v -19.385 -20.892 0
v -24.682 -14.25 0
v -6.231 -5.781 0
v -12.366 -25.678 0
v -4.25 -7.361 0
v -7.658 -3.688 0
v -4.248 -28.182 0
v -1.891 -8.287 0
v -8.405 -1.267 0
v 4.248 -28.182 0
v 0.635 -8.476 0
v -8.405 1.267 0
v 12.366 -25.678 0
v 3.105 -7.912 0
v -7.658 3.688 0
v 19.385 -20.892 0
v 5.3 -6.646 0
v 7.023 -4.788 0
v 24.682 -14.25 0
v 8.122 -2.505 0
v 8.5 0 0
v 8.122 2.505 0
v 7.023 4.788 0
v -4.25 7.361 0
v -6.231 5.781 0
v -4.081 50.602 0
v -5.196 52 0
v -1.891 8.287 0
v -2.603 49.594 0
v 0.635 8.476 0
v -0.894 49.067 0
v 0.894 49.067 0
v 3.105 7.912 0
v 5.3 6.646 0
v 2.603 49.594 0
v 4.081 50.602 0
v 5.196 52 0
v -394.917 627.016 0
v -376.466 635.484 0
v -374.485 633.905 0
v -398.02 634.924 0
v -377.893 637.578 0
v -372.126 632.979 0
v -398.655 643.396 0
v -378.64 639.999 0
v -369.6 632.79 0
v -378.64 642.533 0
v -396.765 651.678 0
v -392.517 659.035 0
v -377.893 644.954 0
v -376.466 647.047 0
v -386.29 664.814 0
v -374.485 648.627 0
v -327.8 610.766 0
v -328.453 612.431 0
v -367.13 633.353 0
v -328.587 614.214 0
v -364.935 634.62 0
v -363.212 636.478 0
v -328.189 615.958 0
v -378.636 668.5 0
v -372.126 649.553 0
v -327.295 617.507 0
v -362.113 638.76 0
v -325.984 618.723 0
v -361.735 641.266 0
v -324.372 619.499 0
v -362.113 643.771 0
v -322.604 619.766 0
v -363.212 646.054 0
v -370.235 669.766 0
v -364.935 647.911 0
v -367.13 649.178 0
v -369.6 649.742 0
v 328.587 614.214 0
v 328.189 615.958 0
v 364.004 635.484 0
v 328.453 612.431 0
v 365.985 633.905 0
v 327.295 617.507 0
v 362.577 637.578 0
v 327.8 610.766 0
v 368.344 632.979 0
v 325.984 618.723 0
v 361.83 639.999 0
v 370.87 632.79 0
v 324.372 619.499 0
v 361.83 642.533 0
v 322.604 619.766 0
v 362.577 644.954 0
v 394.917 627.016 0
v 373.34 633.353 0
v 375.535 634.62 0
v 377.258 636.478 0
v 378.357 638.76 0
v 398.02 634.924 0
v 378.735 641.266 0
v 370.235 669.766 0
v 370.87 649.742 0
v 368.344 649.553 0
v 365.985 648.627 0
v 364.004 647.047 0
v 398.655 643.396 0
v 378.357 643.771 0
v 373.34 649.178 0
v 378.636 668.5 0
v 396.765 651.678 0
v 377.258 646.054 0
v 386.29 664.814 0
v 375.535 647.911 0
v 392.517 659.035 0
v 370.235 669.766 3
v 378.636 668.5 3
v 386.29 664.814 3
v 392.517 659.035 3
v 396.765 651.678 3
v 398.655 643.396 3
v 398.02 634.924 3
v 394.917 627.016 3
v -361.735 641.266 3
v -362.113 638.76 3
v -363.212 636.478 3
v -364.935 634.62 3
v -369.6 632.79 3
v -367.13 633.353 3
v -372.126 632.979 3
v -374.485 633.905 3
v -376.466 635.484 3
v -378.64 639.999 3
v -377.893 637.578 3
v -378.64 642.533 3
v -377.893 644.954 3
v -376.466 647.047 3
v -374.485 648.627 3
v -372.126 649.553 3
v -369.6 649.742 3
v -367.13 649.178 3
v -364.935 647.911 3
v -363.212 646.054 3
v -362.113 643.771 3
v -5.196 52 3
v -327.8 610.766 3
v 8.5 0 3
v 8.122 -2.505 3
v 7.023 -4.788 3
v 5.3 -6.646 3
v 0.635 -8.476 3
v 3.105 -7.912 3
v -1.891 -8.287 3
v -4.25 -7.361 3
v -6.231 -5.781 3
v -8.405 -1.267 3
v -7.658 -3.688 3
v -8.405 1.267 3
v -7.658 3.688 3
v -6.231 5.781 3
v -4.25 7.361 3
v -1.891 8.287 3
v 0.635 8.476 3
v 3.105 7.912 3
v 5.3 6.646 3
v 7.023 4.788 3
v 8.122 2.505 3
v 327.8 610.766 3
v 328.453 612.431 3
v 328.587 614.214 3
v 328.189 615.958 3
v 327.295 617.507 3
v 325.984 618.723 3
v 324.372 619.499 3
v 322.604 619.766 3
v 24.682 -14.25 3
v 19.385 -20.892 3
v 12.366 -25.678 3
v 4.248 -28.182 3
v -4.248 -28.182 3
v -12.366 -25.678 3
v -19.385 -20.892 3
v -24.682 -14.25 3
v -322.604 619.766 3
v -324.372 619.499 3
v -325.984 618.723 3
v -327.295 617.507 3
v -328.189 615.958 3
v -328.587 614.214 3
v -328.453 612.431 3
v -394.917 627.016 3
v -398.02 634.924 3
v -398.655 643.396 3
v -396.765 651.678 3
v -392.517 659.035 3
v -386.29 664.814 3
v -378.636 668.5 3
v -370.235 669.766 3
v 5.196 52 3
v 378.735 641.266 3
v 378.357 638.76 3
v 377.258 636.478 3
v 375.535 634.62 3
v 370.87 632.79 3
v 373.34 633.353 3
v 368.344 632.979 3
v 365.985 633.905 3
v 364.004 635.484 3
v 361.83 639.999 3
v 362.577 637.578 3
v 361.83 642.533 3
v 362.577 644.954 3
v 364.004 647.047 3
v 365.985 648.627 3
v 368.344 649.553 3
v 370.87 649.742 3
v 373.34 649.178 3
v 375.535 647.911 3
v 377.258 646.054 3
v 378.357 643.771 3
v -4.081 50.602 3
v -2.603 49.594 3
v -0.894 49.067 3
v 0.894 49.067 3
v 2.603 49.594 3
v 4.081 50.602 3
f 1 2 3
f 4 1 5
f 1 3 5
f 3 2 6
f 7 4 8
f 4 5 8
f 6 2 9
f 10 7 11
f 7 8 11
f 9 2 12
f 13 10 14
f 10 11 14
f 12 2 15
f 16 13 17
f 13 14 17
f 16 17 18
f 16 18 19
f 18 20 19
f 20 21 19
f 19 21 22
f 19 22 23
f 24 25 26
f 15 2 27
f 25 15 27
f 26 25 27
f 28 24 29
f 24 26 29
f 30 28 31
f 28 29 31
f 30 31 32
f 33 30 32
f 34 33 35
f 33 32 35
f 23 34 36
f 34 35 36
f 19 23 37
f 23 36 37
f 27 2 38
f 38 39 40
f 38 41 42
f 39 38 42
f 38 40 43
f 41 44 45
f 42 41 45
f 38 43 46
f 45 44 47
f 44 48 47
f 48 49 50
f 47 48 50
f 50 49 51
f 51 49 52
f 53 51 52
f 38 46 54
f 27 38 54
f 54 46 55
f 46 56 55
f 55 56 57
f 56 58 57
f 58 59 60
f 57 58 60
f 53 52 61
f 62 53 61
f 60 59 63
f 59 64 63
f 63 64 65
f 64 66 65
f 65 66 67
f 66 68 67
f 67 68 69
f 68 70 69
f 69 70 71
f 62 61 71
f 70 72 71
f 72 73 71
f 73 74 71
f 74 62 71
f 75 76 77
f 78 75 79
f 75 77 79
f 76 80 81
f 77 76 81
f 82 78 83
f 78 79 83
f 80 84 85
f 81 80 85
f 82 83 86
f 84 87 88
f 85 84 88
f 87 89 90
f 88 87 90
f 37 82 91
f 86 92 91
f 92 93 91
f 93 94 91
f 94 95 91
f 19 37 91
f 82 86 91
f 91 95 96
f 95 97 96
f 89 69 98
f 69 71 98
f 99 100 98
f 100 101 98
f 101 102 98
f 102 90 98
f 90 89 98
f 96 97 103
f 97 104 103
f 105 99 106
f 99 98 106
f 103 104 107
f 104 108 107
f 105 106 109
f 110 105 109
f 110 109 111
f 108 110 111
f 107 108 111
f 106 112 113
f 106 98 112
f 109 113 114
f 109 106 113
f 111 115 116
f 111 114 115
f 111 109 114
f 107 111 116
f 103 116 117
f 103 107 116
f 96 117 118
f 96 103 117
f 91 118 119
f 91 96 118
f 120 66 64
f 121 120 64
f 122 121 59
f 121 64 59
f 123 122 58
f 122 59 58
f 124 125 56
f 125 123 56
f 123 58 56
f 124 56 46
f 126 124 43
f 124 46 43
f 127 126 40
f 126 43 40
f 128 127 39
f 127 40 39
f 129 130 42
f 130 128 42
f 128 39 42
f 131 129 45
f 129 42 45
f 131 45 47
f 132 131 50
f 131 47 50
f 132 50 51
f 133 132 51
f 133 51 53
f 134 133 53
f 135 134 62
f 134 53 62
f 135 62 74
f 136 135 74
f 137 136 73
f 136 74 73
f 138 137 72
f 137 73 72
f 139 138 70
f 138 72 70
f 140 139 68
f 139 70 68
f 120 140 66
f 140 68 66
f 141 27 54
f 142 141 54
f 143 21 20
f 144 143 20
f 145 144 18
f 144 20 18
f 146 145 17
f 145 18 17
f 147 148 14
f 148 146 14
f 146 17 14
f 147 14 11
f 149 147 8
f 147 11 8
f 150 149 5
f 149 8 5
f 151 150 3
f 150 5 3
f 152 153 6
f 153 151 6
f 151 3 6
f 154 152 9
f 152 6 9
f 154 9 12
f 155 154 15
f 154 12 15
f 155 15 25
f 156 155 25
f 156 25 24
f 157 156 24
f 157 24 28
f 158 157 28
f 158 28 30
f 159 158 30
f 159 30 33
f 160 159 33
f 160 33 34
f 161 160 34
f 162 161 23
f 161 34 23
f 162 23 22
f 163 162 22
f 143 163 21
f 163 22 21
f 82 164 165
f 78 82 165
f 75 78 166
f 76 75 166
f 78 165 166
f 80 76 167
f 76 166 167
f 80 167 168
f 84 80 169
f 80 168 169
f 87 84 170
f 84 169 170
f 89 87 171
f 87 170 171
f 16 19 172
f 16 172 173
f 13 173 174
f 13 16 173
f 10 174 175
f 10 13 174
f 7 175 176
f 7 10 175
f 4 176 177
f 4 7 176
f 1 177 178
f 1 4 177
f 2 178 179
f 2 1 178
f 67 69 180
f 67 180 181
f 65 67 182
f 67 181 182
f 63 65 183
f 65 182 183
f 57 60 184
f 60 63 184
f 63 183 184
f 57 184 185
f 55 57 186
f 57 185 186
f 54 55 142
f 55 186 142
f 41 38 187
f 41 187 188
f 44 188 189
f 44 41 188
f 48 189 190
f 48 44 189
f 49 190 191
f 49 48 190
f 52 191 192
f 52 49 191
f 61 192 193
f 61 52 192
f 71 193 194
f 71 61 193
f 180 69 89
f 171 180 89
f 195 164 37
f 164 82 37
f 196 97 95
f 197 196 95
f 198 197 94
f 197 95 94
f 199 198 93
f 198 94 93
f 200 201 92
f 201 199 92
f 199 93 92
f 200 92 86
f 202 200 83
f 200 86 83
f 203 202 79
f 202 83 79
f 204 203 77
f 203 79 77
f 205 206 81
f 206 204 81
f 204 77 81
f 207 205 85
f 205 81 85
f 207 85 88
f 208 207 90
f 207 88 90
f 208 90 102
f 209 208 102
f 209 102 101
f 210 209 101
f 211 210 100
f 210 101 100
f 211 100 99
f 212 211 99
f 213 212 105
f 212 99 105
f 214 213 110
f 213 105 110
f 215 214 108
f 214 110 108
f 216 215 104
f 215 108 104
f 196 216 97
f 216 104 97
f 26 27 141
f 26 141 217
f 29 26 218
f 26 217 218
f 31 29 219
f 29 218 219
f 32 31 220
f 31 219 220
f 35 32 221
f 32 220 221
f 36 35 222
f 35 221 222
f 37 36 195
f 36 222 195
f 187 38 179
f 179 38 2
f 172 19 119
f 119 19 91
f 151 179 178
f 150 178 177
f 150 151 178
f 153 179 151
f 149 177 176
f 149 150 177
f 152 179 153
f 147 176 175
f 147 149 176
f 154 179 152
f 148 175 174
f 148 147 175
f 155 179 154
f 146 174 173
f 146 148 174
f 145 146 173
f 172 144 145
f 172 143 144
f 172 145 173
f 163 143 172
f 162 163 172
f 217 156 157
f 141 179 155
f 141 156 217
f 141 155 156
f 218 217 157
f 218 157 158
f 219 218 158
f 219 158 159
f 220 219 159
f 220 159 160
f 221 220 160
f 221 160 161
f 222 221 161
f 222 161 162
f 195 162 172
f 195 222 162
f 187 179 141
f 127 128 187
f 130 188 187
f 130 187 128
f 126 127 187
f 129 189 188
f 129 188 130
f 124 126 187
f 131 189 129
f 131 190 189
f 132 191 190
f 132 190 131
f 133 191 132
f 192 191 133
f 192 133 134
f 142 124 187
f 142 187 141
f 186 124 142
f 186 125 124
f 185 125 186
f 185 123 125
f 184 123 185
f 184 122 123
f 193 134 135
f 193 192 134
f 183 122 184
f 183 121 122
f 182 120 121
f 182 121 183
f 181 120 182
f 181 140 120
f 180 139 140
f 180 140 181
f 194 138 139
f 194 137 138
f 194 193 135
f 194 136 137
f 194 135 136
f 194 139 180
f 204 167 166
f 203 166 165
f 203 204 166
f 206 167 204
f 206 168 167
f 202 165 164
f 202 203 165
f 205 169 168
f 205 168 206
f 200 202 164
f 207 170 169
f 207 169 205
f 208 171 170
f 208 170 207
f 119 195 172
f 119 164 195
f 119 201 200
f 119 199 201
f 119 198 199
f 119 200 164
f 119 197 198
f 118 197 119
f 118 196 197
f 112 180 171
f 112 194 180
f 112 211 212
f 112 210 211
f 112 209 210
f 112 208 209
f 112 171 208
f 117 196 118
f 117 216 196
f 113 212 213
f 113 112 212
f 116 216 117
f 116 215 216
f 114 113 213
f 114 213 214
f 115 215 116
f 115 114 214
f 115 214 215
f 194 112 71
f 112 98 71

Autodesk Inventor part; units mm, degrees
ref_plane "YZ Plane" through (0, 0, 0) normal (1, 0, 0) x (0, 1, 0)
ref_plane "XZ Plane" through (0, 0, 0) normal (0, 1, 0) x (-1, 0, 0)
ref_plane "XY Plane" through (0, 0, 0) normal (0, 0, 1) x (1, 0, 0)
sketch "Sketch1" plane through (0, 0, 0) normal (0, 0, 1) x (1, 0, 0)
  circle A0 centre (0, 0) radius 8.5
  line L0 (-394.9167, 627.0158) -> (-24.6817, -14.25)
  arc A1 (-24.6817, -14.25) -> (24.6817, -14.25) centre (0, 0) ccw
  line L1 (24.6817, -14.25) -> (394.9167, 627.0158)
  arc A2 (394.9167, 627.0158) -> (370.235, 669.7658) centre (370.235, 641.2658) ccw
  line L2 (370.235, 669.7658) -> (-370.235, 669.7658)
  arc A3 (-370.235, 669.7658) -> (-394.9167, 627.0158) centre (-370.235, 641.2658) ccw
  line L3 (0, 0) -> (0, 669.7658) construction
  line L4 (-332.9959, 619.7658) -> (332.9959, 619.7658)
  line L5 (332.9959, 619.7658) -> (0, 43)
  line L6 (0, 43) -> (-332.9959, 619.7658)
  circle A4 centre (-370.235, 641.2658) radius 8.5
  circle A5 centre (370.235, 641.2658) radius 8.5
  dimension "d34" = 17
  dimension "d35" = 20
  dimension "d36" = 740.47
  dimension "d37" = 740.47
  dimension "d38" = 50
extrude "Plate1" add sketch "Sketch1" along normal blind 3
fillet "Corner Round3" radius 6 3 edges at (-332.9959, 619.7658, 1.5) (0, 43, 1.5) (332.9959, 619.7658, 1.5)
equation "\"d37\" = d36"
equation "\"d2\" = Thickness"
equation "\"BendReliefWidth\" = Thickness"
equation "\"BendReliefDepth\" = 0.5 * Thickness"
equation "\"CornerReliefSize\" = 4 * Thickness"
equation "\"MinimumRemnant\" = 2 * Thickness"
equation "\"TransitionRadius\" = BendRadius"
equation "\"JacobiRadiusSize\" = BendRadius"
equation "\"GapSize\" = Thickness"
equation "\"Thickness\" = 3"
equation "\"BendRadius\" = 5"
properties part number "PNS-689 leg floor pattern" material "Stainless Steel"
